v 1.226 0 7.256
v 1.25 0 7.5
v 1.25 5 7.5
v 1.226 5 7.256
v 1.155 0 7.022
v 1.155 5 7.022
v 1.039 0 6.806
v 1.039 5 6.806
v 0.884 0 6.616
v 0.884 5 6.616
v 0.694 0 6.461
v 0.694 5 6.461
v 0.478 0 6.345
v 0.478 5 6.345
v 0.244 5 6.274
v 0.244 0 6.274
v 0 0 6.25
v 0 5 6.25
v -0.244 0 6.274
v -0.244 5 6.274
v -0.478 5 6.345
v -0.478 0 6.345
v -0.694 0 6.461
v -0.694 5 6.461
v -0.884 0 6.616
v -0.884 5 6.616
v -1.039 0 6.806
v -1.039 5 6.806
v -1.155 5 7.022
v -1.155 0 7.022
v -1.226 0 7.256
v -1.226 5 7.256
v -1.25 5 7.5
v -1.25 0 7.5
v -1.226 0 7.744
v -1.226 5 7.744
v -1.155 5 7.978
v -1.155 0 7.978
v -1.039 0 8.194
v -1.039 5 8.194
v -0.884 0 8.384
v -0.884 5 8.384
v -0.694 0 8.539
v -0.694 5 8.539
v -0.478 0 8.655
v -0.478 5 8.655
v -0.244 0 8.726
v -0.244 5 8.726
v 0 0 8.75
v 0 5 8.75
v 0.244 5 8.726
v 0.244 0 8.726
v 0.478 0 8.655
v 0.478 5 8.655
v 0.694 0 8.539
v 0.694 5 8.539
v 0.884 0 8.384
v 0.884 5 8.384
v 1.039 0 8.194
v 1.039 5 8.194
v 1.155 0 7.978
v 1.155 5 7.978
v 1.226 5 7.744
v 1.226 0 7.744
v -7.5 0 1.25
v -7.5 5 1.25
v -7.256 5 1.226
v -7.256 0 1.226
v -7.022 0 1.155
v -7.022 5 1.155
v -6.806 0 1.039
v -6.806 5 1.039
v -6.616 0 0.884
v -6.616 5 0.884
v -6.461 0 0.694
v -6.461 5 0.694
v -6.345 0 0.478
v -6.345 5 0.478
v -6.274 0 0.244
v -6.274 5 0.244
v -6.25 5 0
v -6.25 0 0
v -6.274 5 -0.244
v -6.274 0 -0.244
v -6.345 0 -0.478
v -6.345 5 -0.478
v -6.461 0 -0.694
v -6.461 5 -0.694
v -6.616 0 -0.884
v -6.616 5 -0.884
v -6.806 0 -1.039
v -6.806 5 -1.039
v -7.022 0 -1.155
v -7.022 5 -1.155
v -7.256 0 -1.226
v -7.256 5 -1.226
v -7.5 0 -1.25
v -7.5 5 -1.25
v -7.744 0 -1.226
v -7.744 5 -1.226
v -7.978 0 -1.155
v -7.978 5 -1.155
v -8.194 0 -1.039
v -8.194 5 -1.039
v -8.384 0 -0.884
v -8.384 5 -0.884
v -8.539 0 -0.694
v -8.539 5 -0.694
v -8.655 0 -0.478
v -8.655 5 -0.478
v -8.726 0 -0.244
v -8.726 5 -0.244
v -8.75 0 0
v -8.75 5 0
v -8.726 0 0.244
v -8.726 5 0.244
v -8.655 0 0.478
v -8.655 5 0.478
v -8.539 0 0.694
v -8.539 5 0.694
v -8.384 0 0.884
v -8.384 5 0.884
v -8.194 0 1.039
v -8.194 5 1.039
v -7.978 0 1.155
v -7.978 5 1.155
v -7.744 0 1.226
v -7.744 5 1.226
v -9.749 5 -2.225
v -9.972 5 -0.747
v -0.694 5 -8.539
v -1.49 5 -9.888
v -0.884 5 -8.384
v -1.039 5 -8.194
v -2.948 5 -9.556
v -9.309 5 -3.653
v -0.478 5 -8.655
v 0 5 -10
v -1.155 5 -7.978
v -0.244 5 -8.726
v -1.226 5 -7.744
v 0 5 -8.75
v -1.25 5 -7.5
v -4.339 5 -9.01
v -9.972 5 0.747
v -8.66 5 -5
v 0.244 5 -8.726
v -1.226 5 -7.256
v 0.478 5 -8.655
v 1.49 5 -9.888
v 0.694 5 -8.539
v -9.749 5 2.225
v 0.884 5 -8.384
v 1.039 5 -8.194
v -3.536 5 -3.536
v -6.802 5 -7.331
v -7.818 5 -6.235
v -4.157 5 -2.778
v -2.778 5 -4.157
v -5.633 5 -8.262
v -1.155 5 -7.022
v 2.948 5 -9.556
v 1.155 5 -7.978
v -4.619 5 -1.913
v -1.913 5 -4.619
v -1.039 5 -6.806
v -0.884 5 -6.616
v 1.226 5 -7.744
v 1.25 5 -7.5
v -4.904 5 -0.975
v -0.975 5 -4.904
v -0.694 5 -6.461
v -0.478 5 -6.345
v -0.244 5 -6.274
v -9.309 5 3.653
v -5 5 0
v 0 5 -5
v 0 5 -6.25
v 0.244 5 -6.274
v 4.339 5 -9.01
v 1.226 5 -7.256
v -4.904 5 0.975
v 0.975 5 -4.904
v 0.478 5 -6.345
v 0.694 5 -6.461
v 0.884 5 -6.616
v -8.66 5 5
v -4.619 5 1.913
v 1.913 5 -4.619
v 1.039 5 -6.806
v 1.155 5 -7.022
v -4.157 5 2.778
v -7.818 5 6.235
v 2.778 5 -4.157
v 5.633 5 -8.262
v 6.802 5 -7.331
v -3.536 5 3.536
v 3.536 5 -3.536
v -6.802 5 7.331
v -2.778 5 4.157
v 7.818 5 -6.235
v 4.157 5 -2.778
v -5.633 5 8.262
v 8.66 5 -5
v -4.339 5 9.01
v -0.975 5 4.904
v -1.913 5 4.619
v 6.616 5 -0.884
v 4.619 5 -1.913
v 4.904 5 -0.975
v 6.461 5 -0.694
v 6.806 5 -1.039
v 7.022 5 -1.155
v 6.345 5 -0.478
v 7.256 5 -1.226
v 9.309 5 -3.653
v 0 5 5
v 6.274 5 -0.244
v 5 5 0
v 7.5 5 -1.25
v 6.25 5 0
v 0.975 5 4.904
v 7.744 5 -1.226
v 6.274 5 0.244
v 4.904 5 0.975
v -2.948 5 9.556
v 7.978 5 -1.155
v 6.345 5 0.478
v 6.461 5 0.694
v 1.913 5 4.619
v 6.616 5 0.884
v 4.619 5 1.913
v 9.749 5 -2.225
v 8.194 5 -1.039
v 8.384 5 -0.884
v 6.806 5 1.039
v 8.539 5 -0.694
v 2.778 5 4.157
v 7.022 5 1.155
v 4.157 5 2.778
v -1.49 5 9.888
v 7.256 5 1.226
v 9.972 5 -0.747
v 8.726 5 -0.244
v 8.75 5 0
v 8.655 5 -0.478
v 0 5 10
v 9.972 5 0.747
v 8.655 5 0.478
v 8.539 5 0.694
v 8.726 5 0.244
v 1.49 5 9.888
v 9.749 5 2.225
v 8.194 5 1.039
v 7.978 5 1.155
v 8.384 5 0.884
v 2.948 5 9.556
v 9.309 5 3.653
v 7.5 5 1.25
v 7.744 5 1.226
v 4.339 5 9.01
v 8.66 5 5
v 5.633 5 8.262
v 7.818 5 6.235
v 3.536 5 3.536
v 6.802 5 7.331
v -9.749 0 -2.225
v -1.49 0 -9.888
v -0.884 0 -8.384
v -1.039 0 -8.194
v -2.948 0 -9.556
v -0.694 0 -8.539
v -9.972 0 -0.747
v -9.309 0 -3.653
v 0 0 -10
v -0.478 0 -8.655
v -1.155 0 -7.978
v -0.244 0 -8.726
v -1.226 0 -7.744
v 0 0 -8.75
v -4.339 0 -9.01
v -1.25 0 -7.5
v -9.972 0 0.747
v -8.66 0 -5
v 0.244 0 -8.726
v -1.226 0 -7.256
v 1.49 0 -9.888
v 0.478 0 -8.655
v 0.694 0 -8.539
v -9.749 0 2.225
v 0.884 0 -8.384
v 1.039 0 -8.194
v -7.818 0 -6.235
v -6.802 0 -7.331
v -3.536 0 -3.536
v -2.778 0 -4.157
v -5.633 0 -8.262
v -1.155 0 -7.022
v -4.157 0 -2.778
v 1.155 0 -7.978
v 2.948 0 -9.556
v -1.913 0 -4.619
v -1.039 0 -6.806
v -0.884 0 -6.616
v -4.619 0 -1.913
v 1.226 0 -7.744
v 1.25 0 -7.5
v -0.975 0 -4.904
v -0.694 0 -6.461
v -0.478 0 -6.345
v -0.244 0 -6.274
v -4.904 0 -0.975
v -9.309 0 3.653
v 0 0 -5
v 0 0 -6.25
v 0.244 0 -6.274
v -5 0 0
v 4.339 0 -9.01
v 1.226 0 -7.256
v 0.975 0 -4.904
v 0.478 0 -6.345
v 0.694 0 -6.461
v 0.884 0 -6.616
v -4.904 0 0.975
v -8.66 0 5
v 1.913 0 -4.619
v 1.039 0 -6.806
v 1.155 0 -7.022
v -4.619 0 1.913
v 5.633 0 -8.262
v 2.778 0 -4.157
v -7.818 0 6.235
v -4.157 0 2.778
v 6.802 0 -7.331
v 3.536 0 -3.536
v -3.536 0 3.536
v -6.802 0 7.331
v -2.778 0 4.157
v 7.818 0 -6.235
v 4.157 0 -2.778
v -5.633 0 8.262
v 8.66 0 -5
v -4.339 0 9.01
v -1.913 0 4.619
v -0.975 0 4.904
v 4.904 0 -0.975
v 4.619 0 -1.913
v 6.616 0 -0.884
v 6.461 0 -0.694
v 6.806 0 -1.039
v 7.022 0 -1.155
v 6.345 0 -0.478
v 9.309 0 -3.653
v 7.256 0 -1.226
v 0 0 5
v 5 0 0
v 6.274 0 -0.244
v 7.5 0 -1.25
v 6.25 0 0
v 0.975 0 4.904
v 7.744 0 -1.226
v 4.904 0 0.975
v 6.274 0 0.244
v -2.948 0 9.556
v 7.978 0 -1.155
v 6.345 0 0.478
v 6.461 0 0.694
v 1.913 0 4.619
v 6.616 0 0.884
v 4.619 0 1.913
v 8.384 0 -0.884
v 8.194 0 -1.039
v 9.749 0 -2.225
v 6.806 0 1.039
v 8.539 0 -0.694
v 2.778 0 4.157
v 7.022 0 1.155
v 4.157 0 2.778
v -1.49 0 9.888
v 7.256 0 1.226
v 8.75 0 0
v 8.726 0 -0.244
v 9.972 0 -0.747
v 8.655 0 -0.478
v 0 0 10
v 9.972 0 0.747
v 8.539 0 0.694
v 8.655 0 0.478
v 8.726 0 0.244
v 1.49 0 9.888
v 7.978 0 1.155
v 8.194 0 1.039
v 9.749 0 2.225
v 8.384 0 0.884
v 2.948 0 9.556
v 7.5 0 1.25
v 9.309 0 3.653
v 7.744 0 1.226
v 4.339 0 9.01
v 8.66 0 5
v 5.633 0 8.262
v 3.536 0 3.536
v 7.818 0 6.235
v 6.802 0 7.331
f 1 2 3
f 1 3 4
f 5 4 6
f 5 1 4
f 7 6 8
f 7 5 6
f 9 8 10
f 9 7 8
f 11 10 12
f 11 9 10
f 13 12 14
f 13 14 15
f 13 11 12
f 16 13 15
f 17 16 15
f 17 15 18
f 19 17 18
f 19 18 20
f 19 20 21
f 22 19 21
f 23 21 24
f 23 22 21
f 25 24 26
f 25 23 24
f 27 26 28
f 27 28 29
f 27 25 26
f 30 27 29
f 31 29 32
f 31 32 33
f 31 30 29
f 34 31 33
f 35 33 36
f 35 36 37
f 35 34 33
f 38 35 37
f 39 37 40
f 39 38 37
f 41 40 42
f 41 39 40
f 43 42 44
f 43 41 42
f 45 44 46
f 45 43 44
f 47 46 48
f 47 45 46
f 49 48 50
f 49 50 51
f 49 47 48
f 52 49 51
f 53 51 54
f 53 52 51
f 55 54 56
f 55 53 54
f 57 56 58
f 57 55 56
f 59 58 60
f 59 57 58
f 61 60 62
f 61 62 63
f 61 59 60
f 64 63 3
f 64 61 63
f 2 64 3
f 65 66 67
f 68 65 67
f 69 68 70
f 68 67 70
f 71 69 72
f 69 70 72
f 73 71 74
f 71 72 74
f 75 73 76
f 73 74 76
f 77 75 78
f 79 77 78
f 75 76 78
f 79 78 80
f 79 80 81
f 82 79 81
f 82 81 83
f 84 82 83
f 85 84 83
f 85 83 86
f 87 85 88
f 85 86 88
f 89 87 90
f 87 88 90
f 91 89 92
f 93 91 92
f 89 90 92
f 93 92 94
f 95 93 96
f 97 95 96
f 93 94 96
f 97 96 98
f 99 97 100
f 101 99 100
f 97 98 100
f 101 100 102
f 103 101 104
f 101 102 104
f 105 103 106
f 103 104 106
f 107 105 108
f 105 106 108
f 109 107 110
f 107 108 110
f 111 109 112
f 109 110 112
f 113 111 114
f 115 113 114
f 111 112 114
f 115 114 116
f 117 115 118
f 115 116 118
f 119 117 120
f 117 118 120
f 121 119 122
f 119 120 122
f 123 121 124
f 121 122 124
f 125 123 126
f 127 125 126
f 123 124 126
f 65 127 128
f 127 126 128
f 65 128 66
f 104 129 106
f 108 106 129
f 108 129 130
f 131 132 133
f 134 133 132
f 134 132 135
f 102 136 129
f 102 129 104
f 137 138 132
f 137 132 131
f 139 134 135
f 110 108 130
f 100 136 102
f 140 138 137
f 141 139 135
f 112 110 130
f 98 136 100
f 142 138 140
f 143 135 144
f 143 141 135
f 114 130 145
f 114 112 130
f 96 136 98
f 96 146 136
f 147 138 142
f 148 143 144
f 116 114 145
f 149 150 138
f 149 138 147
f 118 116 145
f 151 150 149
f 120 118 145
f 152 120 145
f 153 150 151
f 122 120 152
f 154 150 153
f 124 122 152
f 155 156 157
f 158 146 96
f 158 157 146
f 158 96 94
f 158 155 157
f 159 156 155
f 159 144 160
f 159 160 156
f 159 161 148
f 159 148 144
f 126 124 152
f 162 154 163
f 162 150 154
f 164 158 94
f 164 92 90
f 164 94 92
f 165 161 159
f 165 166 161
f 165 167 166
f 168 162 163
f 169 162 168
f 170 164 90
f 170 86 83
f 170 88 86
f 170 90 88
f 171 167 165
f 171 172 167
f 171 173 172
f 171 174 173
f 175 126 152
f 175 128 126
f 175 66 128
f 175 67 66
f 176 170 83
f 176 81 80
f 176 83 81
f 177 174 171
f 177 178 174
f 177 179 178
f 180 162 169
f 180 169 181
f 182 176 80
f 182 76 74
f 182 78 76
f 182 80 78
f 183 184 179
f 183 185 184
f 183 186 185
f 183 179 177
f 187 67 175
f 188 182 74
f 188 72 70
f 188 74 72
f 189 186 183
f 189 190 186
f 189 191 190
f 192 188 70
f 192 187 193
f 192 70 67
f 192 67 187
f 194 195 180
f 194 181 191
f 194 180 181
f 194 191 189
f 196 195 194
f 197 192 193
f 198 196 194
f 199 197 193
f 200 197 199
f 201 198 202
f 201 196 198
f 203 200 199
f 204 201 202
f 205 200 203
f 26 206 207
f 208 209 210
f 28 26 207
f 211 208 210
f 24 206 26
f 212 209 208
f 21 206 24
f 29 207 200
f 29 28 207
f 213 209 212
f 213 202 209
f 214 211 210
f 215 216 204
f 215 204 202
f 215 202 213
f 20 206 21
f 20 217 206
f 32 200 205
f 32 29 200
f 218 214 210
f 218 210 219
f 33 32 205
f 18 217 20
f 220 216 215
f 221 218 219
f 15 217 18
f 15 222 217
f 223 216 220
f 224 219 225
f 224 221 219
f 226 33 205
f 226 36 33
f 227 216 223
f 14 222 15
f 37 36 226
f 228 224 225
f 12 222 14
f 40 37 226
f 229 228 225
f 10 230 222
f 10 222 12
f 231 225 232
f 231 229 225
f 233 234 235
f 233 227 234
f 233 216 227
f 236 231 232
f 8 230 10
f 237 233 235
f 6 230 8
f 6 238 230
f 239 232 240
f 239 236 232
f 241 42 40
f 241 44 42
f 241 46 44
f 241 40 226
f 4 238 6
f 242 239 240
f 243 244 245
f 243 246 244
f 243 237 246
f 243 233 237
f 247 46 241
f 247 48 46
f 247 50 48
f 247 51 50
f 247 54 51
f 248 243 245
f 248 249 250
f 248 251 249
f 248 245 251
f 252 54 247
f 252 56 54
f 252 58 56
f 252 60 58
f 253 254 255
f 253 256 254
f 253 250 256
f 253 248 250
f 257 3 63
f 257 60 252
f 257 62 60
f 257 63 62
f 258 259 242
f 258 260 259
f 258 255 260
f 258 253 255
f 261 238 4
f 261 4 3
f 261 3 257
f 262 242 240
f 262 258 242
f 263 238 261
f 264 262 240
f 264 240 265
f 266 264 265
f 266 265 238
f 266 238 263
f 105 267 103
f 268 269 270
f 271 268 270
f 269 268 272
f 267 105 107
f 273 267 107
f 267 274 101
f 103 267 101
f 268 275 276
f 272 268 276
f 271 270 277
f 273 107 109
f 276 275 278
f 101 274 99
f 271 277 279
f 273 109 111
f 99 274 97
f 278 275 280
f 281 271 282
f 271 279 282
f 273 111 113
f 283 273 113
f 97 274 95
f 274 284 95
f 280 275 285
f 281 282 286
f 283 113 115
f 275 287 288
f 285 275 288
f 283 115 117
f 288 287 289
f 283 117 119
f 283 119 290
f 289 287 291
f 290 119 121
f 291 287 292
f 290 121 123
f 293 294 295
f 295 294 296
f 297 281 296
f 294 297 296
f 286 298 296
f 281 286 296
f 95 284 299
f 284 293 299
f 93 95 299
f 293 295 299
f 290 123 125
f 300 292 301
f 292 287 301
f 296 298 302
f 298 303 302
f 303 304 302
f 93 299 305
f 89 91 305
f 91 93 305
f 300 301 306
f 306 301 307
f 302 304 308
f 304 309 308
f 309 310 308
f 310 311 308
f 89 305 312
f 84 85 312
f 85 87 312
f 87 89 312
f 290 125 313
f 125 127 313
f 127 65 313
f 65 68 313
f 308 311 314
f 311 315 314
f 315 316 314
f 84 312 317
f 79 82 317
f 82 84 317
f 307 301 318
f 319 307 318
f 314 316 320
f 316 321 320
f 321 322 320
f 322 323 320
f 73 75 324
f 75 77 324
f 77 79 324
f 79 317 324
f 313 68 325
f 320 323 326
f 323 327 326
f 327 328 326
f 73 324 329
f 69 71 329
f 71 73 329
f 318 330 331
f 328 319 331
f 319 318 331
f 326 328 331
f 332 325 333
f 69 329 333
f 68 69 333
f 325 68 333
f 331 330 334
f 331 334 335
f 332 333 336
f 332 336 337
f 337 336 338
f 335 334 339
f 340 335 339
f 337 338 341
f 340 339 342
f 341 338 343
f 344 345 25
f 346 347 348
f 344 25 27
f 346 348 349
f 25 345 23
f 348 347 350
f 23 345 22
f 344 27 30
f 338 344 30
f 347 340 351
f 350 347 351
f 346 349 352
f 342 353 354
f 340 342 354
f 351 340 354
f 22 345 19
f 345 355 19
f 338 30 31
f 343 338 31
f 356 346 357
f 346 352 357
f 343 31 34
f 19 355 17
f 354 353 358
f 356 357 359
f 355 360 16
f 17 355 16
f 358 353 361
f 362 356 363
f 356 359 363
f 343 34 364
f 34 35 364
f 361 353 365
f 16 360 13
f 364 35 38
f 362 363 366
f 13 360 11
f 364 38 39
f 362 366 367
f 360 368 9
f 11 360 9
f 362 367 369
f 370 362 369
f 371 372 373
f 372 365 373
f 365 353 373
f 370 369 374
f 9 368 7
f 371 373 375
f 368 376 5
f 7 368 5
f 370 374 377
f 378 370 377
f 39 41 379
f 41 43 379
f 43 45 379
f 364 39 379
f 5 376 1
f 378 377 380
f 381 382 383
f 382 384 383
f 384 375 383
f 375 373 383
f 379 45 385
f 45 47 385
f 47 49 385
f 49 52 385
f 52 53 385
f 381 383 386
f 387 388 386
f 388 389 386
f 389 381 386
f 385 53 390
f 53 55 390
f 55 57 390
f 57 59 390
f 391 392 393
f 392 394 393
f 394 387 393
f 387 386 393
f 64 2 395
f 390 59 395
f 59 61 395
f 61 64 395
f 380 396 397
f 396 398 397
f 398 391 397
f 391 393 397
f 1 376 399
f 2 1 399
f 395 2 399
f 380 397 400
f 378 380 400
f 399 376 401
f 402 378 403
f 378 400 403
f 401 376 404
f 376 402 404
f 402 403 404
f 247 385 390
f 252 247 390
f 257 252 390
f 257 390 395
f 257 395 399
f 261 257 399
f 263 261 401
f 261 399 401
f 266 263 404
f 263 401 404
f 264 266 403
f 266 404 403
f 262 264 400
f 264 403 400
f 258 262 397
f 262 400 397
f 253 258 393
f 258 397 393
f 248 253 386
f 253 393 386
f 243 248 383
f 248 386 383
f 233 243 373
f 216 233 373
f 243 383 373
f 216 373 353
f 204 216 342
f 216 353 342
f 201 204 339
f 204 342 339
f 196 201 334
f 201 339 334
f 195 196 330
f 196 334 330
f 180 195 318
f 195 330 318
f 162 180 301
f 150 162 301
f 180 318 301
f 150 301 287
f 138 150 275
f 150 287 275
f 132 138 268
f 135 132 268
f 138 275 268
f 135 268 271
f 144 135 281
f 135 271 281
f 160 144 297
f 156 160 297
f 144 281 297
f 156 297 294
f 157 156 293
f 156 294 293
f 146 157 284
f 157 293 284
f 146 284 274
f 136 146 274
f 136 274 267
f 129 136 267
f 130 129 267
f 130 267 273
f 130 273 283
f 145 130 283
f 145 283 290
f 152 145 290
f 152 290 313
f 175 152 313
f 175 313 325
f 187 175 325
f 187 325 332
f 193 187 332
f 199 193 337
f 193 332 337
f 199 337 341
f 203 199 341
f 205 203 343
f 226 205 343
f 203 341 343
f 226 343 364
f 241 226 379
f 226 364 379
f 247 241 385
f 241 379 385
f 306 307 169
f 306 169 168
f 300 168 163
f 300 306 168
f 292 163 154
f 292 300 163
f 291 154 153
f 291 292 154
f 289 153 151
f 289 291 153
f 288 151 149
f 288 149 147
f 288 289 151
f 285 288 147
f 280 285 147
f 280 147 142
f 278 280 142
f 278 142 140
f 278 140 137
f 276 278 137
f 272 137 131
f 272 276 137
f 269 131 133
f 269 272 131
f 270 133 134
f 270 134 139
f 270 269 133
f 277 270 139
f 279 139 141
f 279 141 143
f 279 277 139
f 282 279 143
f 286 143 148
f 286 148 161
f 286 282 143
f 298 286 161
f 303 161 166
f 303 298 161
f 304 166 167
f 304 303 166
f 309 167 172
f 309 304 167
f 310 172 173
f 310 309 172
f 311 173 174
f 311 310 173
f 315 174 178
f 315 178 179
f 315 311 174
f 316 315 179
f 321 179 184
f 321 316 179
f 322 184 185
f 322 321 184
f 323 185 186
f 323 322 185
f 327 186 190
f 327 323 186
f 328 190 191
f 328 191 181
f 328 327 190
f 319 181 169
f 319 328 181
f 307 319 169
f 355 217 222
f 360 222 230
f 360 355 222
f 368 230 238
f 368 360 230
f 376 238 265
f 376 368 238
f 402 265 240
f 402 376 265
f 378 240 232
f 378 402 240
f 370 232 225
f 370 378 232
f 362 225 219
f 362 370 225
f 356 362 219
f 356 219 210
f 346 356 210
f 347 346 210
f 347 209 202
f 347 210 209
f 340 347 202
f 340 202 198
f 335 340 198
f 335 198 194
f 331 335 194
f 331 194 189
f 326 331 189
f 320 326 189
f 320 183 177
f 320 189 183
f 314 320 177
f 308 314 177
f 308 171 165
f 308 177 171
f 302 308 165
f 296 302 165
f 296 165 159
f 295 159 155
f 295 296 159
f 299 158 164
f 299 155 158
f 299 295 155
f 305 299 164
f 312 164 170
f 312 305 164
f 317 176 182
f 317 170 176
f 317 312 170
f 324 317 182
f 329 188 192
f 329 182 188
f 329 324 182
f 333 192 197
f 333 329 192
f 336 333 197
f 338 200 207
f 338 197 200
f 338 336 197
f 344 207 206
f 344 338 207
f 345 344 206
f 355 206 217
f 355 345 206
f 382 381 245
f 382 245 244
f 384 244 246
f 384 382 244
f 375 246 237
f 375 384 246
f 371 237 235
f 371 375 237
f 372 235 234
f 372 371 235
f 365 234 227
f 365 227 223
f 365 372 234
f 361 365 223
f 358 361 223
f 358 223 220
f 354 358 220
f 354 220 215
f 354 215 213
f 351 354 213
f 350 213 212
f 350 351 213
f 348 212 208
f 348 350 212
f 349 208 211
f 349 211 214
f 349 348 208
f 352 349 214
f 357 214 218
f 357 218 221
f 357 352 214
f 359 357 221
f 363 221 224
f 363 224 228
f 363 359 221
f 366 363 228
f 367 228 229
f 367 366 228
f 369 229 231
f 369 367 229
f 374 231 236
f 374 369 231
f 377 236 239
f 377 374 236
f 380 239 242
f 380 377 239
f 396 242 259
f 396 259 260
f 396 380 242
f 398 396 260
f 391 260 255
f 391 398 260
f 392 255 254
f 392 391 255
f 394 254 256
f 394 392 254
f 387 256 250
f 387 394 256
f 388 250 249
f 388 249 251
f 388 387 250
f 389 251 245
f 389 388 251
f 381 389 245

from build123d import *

# Parameters (mm, degrees)
SKETCH1_R             = 10
BOSS_EXTRUDE1_DEPTH   = 5
SKETCH2_R             = 5
CUT_EXTRUDE1_DEPTH    = 16
SKETCH3_R             = 1.25
CUT_EXTRUDE2_DEPTH    = 5
CIRPATTERN1_OUTLINE_R = 1.25
CIRPATTERN1_DEPTH     = 5


# Read off the part's stored shape, not the designer's step: CirPattern1
with BuildPart() as part:
    # Sketch1 → Boss-Extrude1 (new body)
    with BuildSketch(Plane(origin=(0, 0, 0), x_dir=(1, 0, 0), z_dir=(0, 1, 0))):
        with Locations(Location((0, 0, 0), (0, 0, 270))):
            Circle(SKETCH1_R)
    extrude(amount=BOSS_EXTRUDE1_DEPTH)

    # Sketch2 → Cut-Extrude1 (cut, through all)
    with BuildSketch(Plane(origin=(0, 0, 0), x_dir=(1, 0, 0), z_dir=(0, 1, 0))):
        with Locations(Location((0, 0, 0), (0, 0, 270))):
            Circle(SKETCH2_R)
    extrude(amount=CUT_EXTRUDE1_DEPTH, mode=Mode.SUBTRACT)

    # Sketch3 → Cut-Extrude2 (cut)
    with BuildSketch(Plane(origin=(0, 5, 0), x_dir=(1, 0, 0), z_dir=(0, 1, 0))):
        with Locations(Location((-7.5, 0, 0), (0, 0, 270))):
            Circle(SKETCH3_R)
    extrude(amount=-CUT_EXTRUDE2_DEPTH, mode=Mode.SUBTRACT)

    # CirPattern1 outline → CirPattern1 (cut)
    with BuildSketch(Plane(origin=(0, 0, 0), x_dir=(1, 0, 0), z_dir=(0, 1, 0))):
        with Locations((0, 7.5)):
            Circle(CIRPATTERN1_OUTLINE_R)
        with Locations((7.5, 0)):
            Circle(CIRPATTERN1_OUTLINE_R)
        with Locations((0, -7.5)):
            Circle(CIRPATTERN1_OUTLINE_R)
    extrude(amount=CIRPATTERN1_DEPTH, mode=Mode.SUBTRACT)


solid = part.part
